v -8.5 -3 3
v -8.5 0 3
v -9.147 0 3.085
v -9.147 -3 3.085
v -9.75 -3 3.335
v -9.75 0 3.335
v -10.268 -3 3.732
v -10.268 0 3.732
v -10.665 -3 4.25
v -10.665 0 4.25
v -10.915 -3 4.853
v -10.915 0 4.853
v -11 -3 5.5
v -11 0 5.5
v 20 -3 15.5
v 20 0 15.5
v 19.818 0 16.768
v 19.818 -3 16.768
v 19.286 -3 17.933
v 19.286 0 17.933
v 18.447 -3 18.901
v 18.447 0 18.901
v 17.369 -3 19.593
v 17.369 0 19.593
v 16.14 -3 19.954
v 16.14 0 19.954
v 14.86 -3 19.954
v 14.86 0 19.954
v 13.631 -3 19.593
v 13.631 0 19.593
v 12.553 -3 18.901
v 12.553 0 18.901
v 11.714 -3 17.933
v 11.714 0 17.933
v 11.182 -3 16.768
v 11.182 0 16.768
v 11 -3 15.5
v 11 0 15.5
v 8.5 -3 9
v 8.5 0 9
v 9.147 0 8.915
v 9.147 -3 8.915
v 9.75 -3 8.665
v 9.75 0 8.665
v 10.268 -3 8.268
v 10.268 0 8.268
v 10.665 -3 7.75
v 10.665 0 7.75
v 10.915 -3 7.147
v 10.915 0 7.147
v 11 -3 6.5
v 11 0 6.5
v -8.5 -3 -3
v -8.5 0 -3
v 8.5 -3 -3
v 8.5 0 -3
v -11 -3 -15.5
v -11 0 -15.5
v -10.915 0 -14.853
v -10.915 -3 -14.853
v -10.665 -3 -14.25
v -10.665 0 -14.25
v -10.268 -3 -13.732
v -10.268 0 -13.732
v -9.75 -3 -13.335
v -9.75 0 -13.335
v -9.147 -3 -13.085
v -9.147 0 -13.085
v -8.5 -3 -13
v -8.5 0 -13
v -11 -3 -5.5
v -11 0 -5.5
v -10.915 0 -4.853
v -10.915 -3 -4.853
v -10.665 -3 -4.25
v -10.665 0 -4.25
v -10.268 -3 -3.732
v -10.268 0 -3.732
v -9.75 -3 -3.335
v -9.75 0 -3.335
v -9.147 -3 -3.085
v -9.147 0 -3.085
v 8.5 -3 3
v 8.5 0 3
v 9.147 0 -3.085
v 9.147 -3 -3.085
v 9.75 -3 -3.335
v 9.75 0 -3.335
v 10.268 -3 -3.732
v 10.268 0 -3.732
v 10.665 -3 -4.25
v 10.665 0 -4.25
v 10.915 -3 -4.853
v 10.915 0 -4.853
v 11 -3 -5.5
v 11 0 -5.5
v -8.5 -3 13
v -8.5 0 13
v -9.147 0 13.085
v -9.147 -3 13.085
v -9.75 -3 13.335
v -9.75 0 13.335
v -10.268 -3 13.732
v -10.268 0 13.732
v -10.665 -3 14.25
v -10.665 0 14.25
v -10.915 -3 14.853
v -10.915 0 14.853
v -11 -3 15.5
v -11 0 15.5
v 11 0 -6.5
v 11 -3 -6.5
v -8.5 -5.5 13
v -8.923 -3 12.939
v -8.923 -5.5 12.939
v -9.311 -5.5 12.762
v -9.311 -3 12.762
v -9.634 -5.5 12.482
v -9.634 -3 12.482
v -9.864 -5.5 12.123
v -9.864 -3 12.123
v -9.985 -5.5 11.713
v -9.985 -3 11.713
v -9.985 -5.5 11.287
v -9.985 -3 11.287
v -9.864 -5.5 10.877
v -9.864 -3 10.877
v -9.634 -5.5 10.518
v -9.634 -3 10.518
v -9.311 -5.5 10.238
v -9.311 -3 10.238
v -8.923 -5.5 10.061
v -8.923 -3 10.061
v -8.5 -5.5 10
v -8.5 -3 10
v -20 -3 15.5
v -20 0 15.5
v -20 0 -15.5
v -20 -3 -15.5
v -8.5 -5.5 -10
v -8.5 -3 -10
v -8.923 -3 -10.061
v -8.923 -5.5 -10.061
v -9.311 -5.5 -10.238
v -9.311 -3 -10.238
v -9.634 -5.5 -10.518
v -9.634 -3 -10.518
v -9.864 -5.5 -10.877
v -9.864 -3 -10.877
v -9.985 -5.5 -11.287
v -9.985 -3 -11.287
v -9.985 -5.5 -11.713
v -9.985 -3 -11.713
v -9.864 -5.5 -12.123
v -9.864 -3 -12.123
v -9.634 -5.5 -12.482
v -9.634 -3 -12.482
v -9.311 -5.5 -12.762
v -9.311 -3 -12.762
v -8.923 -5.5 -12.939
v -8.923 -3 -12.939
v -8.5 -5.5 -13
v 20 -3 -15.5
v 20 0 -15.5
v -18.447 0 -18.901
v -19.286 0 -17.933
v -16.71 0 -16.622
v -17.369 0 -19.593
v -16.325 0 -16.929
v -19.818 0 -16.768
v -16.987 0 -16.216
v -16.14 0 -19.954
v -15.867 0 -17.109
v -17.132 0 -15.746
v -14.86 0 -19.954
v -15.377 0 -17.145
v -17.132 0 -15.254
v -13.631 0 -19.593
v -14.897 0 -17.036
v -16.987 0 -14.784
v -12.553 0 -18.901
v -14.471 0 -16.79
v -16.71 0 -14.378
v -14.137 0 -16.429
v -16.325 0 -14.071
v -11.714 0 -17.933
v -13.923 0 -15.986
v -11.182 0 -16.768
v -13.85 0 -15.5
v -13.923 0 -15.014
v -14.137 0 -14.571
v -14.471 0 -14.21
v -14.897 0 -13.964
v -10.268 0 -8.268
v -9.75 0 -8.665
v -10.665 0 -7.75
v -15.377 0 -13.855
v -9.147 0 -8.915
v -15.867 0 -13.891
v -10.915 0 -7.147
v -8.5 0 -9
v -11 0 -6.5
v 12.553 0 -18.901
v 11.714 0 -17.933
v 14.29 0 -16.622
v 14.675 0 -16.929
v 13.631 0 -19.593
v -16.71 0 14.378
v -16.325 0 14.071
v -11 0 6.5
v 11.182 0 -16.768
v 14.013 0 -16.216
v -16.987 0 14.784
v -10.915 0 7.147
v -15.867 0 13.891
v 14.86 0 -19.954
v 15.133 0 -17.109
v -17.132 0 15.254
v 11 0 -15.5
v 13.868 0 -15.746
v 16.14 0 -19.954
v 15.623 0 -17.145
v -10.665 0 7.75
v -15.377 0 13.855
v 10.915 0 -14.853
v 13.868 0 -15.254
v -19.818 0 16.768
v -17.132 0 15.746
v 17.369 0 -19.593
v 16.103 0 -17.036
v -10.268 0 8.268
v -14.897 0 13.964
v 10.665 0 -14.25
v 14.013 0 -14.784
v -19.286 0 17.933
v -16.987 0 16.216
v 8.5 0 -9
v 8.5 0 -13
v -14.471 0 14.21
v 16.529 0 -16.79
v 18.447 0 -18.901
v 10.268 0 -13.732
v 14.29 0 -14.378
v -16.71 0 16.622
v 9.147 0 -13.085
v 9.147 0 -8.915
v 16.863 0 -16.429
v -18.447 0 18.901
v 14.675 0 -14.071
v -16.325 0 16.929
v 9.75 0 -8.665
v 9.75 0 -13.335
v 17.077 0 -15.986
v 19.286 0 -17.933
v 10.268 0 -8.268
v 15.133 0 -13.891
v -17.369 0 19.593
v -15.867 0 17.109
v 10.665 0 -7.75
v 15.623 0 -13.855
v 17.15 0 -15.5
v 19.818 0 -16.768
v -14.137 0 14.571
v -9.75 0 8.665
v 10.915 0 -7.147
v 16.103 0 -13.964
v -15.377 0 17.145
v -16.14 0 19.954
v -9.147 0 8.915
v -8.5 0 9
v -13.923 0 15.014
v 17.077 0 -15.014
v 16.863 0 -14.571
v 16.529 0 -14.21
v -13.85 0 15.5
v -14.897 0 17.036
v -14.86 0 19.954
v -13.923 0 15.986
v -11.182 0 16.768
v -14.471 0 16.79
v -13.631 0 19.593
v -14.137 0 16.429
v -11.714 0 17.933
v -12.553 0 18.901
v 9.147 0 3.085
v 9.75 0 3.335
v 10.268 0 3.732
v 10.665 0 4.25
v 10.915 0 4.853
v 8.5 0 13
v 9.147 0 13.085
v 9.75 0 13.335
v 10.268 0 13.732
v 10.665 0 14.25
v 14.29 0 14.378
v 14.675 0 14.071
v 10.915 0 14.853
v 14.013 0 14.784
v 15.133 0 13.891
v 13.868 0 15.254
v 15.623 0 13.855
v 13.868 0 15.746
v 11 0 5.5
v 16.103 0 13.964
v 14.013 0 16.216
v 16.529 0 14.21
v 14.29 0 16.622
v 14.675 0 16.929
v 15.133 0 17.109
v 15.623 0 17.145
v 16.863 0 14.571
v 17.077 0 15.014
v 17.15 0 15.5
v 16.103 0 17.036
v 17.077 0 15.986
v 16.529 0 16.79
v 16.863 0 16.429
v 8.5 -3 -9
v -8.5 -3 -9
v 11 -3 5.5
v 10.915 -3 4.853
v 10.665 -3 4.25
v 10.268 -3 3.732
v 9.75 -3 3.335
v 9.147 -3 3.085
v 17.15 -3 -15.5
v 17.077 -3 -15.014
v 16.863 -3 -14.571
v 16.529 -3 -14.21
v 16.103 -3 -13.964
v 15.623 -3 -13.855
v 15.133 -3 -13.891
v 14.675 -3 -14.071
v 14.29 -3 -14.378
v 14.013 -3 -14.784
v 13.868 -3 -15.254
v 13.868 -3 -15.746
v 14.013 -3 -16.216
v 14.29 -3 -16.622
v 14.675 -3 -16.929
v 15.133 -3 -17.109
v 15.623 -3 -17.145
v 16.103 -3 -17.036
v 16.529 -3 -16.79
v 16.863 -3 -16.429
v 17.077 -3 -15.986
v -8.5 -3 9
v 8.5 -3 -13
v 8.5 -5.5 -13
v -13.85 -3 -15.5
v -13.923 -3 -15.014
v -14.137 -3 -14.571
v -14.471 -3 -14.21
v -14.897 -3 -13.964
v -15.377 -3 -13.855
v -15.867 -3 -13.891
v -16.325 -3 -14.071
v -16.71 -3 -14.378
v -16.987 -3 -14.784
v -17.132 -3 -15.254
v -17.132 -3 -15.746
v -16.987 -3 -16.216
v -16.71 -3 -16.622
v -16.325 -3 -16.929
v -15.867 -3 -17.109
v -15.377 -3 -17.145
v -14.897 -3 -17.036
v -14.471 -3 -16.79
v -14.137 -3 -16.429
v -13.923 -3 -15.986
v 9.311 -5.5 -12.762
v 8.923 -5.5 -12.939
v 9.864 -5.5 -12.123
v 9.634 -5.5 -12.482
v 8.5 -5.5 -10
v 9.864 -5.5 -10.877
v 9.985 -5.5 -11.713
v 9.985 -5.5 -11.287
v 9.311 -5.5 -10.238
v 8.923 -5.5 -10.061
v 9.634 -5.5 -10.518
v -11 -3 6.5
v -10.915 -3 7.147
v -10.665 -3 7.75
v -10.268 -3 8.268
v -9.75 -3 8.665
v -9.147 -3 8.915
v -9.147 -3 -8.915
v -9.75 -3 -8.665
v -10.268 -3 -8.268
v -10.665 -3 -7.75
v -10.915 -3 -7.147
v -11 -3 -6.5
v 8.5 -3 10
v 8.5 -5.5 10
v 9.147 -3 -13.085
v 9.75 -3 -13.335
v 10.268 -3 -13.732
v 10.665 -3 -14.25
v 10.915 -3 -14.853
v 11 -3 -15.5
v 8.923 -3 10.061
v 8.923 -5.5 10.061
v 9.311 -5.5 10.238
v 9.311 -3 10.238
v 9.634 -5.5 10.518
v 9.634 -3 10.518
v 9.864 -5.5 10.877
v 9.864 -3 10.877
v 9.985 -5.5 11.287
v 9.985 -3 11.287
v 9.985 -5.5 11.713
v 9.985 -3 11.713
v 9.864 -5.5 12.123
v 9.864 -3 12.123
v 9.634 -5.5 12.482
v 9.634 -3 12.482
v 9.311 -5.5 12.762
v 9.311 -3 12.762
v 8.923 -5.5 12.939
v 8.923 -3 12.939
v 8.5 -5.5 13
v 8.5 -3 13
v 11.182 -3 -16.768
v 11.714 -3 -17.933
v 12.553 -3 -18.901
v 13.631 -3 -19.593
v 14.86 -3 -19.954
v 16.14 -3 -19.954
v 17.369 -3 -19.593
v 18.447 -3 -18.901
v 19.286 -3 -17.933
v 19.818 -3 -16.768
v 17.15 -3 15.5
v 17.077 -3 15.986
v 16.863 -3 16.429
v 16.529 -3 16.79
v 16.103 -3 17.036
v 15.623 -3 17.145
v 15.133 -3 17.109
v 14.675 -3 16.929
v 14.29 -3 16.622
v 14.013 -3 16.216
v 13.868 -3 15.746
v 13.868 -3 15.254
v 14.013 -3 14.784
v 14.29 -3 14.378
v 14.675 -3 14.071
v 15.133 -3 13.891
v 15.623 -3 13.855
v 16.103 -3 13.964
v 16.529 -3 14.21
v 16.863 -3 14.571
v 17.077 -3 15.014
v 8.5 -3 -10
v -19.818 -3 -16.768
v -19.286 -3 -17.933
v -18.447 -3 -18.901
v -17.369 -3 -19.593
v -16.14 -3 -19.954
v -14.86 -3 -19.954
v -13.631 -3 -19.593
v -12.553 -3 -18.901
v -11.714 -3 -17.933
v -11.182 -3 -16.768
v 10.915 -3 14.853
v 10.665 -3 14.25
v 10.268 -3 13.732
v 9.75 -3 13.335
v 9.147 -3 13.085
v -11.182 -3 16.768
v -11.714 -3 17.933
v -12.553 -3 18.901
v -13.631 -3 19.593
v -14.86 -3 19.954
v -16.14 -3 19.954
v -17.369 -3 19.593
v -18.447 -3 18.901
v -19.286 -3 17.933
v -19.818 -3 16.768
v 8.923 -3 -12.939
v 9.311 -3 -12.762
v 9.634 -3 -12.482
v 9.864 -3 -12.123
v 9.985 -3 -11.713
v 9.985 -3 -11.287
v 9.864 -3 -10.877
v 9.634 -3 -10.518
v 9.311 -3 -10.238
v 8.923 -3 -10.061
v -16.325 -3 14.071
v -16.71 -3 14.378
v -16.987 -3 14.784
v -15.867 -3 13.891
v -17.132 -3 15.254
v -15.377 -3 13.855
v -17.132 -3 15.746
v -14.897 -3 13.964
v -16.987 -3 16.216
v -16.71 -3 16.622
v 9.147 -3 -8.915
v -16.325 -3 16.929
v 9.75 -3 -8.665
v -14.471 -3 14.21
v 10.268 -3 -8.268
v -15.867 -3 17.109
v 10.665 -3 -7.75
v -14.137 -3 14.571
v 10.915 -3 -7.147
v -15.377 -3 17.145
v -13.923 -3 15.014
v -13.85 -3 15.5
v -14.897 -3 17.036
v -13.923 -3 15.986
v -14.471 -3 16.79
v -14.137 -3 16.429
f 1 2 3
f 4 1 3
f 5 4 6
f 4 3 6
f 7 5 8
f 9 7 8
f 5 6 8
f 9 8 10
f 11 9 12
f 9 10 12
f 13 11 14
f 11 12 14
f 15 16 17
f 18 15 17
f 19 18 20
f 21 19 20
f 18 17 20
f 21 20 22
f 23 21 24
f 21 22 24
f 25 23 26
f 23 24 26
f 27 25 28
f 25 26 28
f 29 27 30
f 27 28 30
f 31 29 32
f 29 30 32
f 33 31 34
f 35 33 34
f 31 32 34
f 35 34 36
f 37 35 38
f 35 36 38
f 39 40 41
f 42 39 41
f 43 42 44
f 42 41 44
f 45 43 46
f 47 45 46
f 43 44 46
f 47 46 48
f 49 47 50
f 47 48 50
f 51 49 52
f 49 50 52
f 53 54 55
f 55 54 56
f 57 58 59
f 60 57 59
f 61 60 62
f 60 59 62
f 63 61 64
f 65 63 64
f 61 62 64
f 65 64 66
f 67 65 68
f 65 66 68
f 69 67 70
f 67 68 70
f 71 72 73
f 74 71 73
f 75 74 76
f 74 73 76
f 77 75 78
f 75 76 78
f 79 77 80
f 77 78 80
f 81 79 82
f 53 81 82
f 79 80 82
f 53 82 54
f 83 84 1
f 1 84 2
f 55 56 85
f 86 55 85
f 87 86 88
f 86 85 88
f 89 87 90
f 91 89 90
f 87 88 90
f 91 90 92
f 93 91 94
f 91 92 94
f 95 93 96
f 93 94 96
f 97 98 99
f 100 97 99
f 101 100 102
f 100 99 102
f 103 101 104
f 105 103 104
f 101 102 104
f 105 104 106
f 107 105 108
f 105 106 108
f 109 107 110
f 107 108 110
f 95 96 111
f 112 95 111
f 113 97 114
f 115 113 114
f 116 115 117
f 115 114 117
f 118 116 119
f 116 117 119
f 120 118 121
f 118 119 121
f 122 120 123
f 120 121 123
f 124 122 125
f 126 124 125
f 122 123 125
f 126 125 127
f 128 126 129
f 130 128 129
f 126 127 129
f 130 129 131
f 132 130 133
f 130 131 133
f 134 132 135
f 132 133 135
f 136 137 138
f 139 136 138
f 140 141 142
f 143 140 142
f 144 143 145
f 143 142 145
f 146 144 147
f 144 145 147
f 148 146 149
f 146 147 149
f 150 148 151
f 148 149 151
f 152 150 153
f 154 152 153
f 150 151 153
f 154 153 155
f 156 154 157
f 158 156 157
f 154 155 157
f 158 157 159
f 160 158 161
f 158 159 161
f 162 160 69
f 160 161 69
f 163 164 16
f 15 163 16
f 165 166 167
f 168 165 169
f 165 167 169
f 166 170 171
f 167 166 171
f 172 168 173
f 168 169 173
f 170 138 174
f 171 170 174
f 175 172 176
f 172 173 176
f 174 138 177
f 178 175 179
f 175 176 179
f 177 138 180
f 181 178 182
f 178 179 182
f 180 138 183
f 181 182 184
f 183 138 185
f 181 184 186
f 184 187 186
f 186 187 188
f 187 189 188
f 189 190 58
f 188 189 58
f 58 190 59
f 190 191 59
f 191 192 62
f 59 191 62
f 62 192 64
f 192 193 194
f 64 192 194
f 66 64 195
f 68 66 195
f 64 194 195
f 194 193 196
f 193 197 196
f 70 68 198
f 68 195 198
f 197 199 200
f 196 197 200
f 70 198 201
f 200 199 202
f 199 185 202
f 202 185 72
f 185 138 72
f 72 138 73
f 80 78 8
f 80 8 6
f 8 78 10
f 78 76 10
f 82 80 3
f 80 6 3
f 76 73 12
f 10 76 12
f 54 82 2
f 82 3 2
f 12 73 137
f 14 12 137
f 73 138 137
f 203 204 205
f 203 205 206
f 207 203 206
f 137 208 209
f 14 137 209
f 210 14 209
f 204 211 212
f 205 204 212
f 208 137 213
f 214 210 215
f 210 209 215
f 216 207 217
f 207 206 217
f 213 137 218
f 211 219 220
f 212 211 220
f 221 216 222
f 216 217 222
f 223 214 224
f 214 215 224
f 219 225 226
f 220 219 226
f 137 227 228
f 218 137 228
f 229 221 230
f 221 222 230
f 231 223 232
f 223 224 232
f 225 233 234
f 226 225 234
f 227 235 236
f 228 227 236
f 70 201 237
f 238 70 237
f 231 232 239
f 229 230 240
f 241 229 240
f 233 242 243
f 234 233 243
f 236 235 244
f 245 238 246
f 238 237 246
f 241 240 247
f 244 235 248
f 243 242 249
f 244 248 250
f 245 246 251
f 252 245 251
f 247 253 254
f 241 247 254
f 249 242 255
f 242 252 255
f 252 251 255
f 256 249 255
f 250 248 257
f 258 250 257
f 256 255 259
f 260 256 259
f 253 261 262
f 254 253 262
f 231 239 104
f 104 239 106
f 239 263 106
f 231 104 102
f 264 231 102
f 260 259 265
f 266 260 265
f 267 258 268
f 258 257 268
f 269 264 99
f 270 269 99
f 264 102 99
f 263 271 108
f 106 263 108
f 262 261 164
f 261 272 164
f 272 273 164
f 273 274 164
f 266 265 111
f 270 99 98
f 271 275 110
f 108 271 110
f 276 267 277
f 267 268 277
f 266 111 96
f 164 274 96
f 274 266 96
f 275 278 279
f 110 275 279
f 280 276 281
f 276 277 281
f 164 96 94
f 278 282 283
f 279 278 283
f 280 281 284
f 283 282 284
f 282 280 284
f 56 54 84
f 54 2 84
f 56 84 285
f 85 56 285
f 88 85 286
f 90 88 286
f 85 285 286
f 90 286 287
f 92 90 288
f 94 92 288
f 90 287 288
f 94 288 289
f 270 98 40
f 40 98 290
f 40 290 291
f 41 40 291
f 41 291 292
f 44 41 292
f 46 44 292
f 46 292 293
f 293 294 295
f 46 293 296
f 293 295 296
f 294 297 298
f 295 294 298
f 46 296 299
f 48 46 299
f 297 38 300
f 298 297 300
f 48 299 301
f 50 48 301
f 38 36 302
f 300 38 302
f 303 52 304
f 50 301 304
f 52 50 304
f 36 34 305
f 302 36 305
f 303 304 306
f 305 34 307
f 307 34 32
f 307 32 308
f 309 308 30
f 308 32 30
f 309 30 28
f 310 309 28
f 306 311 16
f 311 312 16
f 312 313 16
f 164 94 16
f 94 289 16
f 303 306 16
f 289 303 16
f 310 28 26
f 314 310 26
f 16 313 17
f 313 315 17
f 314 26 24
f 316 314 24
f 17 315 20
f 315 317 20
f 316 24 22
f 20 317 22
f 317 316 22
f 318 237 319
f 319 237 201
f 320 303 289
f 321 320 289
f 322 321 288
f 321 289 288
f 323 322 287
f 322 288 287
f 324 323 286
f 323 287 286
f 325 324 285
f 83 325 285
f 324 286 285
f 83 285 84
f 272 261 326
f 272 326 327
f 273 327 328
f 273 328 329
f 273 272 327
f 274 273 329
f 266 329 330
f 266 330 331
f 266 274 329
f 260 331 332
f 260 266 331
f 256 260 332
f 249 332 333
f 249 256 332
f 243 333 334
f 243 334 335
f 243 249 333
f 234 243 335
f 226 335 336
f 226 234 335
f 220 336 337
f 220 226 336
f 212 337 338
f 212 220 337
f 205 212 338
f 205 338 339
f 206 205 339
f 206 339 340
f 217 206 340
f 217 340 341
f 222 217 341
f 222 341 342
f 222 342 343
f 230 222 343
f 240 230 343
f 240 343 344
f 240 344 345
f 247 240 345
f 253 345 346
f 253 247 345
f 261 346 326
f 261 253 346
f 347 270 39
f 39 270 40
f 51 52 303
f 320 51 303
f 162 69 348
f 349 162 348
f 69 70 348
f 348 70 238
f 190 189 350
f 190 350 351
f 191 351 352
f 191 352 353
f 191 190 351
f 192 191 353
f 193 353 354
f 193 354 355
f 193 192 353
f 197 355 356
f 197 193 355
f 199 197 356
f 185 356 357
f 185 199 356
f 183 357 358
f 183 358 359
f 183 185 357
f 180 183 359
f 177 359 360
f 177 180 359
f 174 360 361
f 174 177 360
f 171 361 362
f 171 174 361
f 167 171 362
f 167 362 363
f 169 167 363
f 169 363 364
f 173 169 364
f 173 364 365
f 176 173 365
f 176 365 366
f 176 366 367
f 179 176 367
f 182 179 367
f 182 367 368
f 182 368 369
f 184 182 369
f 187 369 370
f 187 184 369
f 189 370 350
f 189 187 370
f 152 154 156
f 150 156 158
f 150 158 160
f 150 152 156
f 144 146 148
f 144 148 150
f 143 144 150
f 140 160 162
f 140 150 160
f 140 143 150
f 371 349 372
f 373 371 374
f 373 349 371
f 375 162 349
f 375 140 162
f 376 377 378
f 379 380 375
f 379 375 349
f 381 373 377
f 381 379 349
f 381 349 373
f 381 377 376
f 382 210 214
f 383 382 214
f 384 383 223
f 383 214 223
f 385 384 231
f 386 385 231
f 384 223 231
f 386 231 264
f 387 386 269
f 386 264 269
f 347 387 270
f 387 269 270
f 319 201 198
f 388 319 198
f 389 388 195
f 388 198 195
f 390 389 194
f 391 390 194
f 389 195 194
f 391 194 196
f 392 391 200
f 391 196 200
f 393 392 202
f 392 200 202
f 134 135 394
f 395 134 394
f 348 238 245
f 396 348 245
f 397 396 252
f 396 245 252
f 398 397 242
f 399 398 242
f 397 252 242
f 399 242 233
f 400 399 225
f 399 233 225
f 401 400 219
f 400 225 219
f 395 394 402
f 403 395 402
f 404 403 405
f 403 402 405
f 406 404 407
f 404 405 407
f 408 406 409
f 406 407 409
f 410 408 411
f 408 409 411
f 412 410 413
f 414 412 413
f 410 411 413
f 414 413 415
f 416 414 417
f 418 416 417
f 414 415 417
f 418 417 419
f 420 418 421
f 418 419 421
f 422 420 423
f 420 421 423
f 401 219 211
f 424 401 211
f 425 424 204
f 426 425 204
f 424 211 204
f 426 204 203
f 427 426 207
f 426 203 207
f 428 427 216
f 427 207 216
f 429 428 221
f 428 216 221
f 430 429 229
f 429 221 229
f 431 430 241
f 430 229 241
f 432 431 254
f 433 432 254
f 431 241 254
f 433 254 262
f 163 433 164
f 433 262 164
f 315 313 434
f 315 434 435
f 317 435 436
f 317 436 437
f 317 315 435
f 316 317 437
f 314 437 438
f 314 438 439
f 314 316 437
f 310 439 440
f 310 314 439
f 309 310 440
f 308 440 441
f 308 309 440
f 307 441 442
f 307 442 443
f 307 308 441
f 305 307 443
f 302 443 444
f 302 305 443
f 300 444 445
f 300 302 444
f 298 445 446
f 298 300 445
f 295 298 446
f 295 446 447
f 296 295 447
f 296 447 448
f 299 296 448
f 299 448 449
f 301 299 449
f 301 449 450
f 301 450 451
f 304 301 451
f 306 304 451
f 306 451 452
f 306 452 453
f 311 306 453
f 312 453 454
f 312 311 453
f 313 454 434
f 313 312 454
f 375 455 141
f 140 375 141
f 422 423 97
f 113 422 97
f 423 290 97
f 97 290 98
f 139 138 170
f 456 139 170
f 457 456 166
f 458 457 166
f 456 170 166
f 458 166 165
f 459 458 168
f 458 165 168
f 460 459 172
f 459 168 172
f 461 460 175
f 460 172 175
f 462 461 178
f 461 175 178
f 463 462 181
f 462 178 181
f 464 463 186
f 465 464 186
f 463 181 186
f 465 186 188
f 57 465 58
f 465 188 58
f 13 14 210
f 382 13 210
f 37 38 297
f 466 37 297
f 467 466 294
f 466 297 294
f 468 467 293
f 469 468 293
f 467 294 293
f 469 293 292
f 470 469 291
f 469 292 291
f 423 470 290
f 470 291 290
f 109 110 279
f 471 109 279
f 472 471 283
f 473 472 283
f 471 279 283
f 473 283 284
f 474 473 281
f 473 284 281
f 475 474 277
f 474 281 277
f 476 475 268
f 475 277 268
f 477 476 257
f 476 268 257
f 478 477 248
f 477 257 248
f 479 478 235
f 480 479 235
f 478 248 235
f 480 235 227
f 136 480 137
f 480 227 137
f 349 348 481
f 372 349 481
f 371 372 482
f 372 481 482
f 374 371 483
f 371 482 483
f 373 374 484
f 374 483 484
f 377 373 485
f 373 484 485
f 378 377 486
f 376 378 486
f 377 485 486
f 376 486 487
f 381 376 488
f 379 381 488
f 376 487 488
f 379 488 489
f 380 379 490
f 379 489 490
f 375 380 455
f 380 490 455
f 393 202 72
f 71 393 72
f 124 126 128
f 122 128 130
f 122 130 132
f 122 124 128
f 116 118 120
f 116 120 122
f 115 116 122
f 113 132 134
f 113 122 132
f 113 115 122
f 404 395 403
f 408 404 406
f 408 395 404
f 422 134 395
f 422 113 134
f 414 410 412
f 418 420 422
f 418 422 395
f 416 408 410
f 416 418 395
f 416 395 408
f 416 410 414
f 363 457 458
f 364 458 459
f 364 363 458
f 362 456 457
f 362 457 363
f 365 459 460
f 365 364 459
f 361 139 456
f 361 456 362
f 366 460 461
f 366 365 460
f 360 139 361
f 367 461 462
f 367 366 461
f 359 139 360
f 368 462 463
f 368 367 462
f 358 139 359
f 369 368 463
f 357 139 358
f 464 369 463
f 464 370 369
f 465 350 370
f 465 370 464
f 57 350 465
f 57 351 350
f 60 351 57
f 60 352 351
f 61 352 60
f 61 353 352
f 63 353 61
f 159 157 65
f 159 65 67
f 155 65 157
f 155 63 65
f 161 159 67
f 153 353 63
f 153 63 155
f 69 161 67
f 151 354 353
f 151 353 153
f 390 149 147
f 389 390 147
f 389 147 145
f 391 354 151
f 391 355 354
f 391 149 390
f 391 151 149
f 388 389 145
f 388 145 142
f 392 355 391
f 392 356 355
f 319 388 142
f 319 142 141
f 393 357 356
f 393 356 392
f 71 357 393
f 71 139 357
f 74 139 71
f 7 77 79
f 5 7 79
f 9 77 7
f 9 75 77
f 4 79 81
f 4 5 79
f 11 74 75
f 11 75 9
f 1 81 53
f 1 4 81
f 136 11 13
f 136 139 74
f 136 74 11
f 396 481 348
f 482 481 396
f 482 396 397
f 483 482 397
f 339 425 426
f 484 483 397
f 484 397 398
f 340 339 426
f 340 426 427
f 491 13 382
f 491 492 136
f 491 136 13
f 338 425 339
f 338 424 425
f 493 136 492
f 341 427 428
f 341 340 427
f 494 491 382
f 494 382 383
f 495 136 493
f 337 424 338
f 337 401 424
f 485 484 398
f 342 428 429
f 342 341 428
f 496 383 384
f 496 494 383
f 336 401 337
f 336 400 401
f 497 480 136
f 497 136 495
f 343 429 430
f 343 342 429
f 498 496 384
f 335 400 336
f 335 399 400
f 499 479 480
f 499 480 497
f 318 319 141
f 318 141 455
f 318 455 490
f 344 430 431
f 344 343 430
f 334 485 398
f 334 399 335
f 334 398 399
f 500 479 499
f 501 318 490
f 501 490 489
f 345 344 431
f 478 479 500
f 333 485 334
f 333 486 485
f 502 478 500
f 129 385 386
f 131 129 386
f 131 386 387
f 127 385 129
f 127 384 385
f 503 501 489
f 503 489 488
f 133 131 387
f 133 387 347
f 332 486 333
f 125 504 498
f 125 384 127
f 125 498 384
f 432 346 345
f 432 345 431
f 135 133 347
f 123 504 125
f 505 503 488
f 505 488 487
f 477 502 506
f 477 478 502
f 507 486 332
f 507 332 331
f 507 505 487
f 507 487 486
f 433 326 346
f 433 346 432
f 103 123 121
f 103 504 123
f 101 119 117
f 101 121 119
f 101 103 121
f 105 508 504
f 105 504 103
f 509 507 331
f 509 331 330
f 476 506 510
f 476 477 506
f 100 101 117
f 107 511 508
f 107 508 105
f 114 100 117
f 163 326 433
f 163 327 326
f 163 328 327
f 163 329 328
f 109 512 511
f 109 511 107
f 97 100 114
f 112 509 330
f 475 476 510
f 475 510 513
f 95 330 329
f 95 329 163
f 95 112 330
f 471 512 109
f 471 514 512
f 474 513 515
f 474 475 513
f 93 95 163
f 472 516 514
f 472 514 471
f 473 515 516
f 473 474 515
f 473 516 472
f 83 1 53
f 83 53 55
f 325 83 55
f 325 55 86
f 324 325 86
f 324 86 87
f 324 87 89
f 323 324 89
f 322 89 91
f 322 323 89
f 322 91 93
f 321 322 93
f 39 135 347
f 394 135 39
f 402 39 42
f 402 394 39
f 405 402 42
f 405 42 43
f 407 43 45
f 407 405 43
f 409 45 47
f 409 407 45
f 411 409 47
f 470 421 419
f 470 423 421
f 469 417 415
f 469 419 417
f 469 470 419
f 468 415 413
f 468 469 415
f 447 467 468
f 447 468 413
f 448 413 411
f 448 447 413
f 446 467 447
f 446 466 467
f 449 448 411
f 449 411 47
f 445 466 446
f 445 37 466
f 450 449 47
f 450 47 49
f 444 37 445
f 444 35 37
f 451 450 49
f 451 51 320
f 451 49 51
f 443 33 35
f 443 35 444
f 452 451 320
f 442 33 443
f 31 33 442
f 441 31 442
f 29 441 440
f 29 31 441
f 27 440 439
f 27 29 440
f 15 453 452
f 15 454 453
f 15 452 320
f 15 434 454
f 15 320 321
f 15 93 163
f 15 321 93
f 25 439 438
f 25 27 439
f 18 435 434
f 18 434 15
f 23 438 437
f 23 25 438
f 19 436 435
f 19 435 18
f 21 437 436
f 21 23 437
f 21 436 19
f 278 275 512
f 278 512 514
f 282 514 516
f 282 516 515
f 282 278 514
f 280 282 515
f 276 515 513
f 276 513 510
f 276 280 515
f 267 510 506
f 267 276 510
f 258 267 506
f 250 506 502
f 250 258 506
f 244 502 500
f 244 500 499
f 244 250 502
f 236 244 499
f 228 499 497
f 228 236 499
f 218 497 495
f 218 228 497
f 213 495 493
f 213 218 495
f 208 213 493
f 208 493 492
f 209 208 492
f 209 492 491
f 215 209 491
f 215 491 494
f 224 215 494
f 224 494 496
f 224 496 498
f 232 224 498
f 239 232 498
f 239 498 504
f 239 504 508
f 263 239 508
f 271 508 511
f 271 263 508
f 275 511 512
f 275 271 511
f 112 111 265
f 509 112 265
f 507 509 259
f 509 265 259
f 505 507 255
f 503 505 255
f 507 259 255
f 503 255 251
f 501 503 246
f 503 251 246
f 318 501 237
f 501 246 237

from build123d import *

# Parameters (mm, degrees)
F0_R     = 1.65
F1_DEPTH = 3
F3_DEPTH = 2.5


with BuildPart() as f1:
    # F0 (on Front) → F1 (new body)
    with BuildSketch(Plane.XZ):
        with BuildLine():
            ThreePointArc((-8.5, 13), (-10.267767, 13.732233), (-11, 15.5))
            ThreePointArc((-11, 15.5), (-15.5, 20), (-20, 15.5))
            Line((-20, 15.5), (-20, -15.5))
            ThreePointArc((-20, -15.5), (-15.5, -20), (-11, -15.5))
            ThreePointArc((-11, -15.5), (-10.267767, -13.732233), (-8.5, -13))
            Line((-8.5, -13), (8.5, -13))
            ThreePointArc((8.5, -13), (10.267767, -13.732233), (11, -15.5))
            ThreePointArc((11, -15.5), (15.5, -20), (20, -15.5))
            Line((20, -15.5), (20, 15.5))
            ThreePointArc((20, 15.5), (15.5, 20), (11, 15.5))
            ThreePointArc((11, 15.5), (10.267767, 13.732233), (8.5, 13))
            Line((8.5, 13), (-8.5, 13))
        make_face()
        with Locations((-15.5, -15.5)):
            Circle(F0_R, mode=Mode.SUBTRACT)
        with Locations((15.5, -15.5)):
            Circle(F0_R, mode=Mode.SUBTRACT)
        with BuildLine():
            Line((-8.5, -3), (8.5, -3))
            ThreePointArc((8.5, -3), (10.267767, -3.732233), (11, -5.5))
            Line((11, -5.5), (11, -6.5))
            ThreePointArc((11, -6.5), (10.267767, -8.267767), (8.5, -9))
            Line((8.5, -9), (-8.5, -9))
            ThreePointArc((-8.5, -9), (-10.267767, -8.267767), (-11, -6.5))
            Line((-11, -6.5), (-11, -5.5))
            ThreePointArc((-11, -5.5), (-10.267767, -3.732233), (-8.5, -3))
        make_face(mode=Mode.SUBTRACT)
        with Locations((-15.5, 15.5)):
            Circle(F0_R, mode=Mode.SUBTRACT)
        with BuildLine():
            ThreePointArc((11, 5.5), (10.267767, 3.732233), (8.5, 3))
            Line((8.5, 3), (-8.5, 3))
            ThreePointArc((-8.5, 3), (-10.267767, 3.732233), (-11, 5.5))
            Line((-11, 5.5), (-11, 6.5))
            ThreePointArc((-11, 6.5), (-10.267767, 8.267767), (-8.5, 9))
            Line((-8.5, 9), (8.5, 9))
            ThreePointArc((8.5, 9), (10.267767, 8.267767), (11, 6.5))
            Line((11, 6.5), (11, 5.5))
        make_face(mode=Mode.SUBTRACT)
        with Locations((15.5, 15.5)):
            Circle(F0_R, mode=Mode.SUBTRACT)
    extrude(amount=F1_DEPTH)

    # F2 (on face) → F3 (join)
    with BuildSketch(Plane.XZ.offset(3)):
        with BuildLine():
            Line((8.5, -10), (-8.5, -10))
            ThreePointArc((-8.5, -10), (-10, -11.5), (-8.5, -13))
            Line((-8.5, -13), (8.5, -13))
            ThreePointArc((8.5, -13), (10, -11.5), (8.5, -10))
        make_face()
        with BuildLine():
            ThreePointArc((-8.5, 13), (-10, 11.5), (-8.5, 10))
            Line((-8.5, 10), (8.5, 10))
            ThreePointArc((8.5, 10), (10, 11.5), (8.5, 13))
            Line((8.5, 13), (-8.5, 13))
        make_face()
    extrude(amount=F3_DEPTH)


solid = f1.part
